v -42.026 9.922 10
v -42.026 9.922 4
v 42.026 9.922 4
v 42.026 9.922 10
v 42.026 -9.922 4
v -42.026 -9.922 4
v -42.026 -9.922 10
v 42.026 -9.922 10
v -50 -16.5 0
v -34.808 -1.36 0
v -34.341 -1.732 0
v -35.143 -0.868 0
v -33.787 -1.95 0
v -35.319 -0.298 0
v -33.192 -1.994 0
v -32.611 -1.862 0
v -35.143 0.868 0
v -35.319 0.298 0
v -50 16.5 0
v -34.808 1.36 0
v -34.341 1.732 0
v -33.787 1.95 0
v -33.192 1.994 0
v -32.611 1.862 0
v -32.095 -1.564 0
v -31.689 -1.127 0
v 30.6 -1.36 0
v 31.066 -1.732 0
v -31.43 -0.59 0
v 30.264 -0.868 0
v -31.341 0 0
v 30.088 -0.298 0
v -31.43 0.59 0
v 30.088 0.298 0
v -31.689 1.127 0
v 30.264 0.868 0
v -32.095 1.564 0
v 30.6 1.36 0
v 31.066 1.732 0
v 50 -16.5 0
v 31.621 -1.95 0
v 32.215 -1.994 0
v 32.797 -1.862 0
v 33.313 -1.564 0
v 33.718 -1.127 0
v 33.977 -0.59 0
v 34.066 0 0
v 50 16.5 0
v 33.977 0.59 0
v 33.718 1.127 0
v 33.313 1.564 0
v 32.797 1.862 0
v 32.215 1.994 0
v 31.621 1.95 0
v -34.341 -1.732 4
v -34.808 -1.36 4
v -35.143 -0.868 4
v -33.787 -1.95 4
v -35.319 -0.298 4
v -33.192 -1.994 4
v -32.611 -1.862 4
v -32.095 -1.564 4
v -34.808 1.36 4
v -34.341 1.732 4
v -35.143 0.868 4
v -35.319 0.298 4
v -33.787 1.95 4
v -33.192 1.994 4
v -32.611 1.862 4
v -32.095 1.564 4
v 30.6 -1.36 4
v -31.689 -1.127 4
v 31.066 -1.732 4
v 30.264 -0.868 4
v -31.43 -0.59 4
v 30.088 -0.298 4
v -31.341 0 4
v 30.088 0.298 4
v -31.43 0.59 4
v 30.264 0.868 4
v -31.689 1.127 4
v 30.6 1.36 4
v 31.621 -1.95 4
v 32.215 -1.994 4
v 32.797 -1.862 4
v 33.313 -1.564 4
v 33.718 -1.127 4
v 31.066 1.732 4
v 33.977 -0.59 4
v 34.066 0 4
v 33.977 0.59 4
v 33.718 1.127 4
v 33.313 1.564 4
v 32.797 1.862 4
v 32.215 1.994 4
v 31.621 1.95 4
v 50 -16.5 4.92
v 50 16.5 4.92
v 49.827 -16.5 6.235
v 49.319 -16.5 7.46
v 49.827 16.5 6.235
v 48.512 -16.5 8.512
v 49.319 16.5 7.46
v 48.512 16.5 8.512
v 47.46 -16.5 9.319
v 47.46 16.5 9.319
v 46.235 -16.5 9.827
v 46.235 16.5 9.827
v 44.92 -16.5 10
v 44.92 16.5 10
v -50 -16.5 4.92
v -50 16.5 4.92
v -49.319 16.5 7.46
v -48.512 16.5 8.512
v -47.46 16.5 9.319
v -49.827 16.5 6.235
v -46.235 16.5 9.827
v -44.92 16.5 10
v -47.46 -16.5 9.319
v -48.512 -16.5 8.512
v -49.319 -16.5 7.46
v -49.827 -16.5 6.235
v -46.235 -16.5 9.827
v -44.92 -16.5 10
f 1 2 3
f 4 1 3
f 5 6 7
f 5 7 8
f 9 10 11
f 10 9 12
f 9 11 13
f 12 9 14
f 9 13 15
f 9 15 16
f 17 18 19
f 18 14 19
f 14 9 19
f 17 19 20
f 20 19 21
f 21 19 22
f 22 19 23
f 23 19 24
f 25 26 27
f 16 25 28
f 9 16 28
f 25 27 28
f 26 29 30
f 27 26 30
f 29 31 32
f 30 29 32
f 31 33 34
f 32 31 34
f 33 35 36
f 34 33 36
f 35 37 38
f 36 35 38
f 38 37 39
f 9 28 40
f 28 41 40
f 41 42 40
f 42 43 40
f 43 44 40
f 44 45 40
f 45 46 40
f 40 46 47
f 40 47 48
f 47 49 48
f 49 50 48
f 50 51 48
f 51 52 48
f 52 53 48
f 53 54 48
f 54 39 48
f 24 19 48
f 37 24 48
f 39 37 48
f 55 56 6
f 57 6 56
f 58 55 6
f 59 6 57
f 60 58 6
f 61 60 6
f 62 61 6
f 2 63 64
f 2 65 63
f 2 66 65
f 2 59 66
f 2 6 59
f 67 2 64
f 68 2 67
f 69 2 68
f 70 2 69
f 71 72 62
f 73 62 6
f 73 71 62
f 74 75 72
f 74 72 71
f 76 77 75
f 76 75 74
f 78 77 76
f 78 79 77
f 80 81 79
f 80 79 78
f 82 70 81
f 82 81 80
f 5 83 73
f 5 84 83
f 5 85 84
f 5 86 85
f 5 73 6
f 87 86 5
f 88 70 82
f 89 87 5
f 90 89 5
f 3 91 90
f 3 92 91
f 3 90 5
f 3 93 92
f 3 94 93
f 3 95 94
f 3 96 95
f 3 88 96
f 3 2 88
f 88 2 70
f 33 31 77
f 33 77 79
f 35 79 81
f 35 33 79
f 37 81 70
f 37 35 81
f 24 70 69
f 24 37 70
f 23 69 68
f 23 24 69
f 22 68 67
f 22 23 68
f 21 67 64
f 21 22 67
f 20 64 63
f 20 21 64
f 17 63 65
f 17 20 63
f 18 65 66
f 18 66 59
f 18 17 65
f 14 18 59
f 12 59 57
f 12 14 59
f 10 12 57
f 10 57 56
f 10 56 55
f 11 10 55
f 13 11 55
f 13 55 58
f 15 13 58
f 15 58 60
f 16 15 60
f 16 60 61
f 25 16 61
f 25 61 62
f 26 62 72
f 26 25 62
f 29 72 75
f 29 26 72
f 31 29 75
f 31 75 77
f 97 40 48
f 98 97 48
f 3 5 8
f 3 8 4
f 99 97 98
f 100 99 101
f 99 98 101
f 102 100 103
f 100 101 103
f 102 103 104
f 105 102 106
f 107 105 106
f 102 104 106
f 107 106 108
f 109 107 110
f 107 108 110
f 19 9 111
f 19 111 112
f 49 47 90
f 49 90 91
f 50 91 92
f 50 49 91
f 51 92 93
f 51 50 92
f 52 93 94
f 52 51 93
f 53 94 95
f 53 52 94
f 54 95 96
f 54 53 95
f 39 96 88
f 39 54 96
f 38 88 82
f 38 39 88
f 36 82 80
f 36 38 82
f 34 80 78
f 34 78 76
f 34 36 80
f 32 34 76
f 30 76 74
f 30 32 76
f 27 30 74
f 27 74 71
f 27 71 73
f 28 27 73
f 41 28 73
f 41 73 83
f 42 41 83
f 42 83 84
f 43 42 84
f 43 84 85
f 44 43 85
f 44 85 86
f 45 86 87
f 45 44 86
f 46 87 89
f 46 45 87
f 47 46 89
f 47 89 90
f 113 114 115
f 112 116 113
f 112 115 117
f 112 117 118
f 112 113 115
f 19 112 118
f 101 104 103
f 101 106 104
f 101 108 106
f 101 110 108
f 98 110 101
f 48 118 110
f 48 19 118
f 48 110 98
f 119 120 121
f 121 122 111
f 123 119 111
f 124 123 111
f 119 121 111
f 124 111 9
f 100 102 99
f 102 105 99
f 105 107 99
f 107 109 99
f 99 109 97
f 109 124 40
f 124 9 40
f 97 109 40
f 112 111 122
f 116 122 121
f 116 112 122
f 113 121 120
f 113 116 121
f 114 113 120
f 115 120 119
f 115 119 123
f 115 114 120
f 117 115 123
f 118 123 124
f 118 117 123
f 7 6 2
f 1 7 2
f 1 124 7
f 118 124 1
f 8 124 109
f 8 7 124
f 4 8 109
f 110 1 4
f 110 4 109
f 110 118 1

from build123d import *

# Parameters (mm, degrees)
F0_W     = 100
F0_H     = 33
F0_W_2   = 84.051668
F0_H_2   = 19.84357
F0_R     = 2
F1_DEPTH = 4
F2_DEPTH = 10
F3_R     = 5.08


with BuildPart() as f1:
    # F0 (on Top) → F1 (new body)
    with BuildSketch(Plane.XY):
        Rectangle(F0_W, F0_H)
        Rectangle(F0_W_2, F0_H_2, mode=Mode.SUBTRACT)
        Rectangle(F0_W_2, F0_H_2)
        with Locations((-33.341493, 0)):
            Circle(F0_R, mode=Mode.SUBTRACT)
        with Locations((32.065969, 0)):
            Circle(F0_R, mode=Mode.SUBTRACT)
    extrude(amount=F1_DEPTH)

    # F0 (on Top) → F2 (join)
    with BuildSketch(Plane.XY):
        Rectangle(F0_W, F0_H)
        Rectangle(F0_W_2, F0_H_2, mode=Mode.SUBTRACT)
    extrude(amount=F2_DEPTH)

    # F3
    f3_edges = [f1.edges().sort_by_distance(p)[0] for p in [
        (-50, 0, 10),
        (50, 0, 10),
    ]]
    fillet(f3_edges, radius=F3_R)


solid = f1.part
